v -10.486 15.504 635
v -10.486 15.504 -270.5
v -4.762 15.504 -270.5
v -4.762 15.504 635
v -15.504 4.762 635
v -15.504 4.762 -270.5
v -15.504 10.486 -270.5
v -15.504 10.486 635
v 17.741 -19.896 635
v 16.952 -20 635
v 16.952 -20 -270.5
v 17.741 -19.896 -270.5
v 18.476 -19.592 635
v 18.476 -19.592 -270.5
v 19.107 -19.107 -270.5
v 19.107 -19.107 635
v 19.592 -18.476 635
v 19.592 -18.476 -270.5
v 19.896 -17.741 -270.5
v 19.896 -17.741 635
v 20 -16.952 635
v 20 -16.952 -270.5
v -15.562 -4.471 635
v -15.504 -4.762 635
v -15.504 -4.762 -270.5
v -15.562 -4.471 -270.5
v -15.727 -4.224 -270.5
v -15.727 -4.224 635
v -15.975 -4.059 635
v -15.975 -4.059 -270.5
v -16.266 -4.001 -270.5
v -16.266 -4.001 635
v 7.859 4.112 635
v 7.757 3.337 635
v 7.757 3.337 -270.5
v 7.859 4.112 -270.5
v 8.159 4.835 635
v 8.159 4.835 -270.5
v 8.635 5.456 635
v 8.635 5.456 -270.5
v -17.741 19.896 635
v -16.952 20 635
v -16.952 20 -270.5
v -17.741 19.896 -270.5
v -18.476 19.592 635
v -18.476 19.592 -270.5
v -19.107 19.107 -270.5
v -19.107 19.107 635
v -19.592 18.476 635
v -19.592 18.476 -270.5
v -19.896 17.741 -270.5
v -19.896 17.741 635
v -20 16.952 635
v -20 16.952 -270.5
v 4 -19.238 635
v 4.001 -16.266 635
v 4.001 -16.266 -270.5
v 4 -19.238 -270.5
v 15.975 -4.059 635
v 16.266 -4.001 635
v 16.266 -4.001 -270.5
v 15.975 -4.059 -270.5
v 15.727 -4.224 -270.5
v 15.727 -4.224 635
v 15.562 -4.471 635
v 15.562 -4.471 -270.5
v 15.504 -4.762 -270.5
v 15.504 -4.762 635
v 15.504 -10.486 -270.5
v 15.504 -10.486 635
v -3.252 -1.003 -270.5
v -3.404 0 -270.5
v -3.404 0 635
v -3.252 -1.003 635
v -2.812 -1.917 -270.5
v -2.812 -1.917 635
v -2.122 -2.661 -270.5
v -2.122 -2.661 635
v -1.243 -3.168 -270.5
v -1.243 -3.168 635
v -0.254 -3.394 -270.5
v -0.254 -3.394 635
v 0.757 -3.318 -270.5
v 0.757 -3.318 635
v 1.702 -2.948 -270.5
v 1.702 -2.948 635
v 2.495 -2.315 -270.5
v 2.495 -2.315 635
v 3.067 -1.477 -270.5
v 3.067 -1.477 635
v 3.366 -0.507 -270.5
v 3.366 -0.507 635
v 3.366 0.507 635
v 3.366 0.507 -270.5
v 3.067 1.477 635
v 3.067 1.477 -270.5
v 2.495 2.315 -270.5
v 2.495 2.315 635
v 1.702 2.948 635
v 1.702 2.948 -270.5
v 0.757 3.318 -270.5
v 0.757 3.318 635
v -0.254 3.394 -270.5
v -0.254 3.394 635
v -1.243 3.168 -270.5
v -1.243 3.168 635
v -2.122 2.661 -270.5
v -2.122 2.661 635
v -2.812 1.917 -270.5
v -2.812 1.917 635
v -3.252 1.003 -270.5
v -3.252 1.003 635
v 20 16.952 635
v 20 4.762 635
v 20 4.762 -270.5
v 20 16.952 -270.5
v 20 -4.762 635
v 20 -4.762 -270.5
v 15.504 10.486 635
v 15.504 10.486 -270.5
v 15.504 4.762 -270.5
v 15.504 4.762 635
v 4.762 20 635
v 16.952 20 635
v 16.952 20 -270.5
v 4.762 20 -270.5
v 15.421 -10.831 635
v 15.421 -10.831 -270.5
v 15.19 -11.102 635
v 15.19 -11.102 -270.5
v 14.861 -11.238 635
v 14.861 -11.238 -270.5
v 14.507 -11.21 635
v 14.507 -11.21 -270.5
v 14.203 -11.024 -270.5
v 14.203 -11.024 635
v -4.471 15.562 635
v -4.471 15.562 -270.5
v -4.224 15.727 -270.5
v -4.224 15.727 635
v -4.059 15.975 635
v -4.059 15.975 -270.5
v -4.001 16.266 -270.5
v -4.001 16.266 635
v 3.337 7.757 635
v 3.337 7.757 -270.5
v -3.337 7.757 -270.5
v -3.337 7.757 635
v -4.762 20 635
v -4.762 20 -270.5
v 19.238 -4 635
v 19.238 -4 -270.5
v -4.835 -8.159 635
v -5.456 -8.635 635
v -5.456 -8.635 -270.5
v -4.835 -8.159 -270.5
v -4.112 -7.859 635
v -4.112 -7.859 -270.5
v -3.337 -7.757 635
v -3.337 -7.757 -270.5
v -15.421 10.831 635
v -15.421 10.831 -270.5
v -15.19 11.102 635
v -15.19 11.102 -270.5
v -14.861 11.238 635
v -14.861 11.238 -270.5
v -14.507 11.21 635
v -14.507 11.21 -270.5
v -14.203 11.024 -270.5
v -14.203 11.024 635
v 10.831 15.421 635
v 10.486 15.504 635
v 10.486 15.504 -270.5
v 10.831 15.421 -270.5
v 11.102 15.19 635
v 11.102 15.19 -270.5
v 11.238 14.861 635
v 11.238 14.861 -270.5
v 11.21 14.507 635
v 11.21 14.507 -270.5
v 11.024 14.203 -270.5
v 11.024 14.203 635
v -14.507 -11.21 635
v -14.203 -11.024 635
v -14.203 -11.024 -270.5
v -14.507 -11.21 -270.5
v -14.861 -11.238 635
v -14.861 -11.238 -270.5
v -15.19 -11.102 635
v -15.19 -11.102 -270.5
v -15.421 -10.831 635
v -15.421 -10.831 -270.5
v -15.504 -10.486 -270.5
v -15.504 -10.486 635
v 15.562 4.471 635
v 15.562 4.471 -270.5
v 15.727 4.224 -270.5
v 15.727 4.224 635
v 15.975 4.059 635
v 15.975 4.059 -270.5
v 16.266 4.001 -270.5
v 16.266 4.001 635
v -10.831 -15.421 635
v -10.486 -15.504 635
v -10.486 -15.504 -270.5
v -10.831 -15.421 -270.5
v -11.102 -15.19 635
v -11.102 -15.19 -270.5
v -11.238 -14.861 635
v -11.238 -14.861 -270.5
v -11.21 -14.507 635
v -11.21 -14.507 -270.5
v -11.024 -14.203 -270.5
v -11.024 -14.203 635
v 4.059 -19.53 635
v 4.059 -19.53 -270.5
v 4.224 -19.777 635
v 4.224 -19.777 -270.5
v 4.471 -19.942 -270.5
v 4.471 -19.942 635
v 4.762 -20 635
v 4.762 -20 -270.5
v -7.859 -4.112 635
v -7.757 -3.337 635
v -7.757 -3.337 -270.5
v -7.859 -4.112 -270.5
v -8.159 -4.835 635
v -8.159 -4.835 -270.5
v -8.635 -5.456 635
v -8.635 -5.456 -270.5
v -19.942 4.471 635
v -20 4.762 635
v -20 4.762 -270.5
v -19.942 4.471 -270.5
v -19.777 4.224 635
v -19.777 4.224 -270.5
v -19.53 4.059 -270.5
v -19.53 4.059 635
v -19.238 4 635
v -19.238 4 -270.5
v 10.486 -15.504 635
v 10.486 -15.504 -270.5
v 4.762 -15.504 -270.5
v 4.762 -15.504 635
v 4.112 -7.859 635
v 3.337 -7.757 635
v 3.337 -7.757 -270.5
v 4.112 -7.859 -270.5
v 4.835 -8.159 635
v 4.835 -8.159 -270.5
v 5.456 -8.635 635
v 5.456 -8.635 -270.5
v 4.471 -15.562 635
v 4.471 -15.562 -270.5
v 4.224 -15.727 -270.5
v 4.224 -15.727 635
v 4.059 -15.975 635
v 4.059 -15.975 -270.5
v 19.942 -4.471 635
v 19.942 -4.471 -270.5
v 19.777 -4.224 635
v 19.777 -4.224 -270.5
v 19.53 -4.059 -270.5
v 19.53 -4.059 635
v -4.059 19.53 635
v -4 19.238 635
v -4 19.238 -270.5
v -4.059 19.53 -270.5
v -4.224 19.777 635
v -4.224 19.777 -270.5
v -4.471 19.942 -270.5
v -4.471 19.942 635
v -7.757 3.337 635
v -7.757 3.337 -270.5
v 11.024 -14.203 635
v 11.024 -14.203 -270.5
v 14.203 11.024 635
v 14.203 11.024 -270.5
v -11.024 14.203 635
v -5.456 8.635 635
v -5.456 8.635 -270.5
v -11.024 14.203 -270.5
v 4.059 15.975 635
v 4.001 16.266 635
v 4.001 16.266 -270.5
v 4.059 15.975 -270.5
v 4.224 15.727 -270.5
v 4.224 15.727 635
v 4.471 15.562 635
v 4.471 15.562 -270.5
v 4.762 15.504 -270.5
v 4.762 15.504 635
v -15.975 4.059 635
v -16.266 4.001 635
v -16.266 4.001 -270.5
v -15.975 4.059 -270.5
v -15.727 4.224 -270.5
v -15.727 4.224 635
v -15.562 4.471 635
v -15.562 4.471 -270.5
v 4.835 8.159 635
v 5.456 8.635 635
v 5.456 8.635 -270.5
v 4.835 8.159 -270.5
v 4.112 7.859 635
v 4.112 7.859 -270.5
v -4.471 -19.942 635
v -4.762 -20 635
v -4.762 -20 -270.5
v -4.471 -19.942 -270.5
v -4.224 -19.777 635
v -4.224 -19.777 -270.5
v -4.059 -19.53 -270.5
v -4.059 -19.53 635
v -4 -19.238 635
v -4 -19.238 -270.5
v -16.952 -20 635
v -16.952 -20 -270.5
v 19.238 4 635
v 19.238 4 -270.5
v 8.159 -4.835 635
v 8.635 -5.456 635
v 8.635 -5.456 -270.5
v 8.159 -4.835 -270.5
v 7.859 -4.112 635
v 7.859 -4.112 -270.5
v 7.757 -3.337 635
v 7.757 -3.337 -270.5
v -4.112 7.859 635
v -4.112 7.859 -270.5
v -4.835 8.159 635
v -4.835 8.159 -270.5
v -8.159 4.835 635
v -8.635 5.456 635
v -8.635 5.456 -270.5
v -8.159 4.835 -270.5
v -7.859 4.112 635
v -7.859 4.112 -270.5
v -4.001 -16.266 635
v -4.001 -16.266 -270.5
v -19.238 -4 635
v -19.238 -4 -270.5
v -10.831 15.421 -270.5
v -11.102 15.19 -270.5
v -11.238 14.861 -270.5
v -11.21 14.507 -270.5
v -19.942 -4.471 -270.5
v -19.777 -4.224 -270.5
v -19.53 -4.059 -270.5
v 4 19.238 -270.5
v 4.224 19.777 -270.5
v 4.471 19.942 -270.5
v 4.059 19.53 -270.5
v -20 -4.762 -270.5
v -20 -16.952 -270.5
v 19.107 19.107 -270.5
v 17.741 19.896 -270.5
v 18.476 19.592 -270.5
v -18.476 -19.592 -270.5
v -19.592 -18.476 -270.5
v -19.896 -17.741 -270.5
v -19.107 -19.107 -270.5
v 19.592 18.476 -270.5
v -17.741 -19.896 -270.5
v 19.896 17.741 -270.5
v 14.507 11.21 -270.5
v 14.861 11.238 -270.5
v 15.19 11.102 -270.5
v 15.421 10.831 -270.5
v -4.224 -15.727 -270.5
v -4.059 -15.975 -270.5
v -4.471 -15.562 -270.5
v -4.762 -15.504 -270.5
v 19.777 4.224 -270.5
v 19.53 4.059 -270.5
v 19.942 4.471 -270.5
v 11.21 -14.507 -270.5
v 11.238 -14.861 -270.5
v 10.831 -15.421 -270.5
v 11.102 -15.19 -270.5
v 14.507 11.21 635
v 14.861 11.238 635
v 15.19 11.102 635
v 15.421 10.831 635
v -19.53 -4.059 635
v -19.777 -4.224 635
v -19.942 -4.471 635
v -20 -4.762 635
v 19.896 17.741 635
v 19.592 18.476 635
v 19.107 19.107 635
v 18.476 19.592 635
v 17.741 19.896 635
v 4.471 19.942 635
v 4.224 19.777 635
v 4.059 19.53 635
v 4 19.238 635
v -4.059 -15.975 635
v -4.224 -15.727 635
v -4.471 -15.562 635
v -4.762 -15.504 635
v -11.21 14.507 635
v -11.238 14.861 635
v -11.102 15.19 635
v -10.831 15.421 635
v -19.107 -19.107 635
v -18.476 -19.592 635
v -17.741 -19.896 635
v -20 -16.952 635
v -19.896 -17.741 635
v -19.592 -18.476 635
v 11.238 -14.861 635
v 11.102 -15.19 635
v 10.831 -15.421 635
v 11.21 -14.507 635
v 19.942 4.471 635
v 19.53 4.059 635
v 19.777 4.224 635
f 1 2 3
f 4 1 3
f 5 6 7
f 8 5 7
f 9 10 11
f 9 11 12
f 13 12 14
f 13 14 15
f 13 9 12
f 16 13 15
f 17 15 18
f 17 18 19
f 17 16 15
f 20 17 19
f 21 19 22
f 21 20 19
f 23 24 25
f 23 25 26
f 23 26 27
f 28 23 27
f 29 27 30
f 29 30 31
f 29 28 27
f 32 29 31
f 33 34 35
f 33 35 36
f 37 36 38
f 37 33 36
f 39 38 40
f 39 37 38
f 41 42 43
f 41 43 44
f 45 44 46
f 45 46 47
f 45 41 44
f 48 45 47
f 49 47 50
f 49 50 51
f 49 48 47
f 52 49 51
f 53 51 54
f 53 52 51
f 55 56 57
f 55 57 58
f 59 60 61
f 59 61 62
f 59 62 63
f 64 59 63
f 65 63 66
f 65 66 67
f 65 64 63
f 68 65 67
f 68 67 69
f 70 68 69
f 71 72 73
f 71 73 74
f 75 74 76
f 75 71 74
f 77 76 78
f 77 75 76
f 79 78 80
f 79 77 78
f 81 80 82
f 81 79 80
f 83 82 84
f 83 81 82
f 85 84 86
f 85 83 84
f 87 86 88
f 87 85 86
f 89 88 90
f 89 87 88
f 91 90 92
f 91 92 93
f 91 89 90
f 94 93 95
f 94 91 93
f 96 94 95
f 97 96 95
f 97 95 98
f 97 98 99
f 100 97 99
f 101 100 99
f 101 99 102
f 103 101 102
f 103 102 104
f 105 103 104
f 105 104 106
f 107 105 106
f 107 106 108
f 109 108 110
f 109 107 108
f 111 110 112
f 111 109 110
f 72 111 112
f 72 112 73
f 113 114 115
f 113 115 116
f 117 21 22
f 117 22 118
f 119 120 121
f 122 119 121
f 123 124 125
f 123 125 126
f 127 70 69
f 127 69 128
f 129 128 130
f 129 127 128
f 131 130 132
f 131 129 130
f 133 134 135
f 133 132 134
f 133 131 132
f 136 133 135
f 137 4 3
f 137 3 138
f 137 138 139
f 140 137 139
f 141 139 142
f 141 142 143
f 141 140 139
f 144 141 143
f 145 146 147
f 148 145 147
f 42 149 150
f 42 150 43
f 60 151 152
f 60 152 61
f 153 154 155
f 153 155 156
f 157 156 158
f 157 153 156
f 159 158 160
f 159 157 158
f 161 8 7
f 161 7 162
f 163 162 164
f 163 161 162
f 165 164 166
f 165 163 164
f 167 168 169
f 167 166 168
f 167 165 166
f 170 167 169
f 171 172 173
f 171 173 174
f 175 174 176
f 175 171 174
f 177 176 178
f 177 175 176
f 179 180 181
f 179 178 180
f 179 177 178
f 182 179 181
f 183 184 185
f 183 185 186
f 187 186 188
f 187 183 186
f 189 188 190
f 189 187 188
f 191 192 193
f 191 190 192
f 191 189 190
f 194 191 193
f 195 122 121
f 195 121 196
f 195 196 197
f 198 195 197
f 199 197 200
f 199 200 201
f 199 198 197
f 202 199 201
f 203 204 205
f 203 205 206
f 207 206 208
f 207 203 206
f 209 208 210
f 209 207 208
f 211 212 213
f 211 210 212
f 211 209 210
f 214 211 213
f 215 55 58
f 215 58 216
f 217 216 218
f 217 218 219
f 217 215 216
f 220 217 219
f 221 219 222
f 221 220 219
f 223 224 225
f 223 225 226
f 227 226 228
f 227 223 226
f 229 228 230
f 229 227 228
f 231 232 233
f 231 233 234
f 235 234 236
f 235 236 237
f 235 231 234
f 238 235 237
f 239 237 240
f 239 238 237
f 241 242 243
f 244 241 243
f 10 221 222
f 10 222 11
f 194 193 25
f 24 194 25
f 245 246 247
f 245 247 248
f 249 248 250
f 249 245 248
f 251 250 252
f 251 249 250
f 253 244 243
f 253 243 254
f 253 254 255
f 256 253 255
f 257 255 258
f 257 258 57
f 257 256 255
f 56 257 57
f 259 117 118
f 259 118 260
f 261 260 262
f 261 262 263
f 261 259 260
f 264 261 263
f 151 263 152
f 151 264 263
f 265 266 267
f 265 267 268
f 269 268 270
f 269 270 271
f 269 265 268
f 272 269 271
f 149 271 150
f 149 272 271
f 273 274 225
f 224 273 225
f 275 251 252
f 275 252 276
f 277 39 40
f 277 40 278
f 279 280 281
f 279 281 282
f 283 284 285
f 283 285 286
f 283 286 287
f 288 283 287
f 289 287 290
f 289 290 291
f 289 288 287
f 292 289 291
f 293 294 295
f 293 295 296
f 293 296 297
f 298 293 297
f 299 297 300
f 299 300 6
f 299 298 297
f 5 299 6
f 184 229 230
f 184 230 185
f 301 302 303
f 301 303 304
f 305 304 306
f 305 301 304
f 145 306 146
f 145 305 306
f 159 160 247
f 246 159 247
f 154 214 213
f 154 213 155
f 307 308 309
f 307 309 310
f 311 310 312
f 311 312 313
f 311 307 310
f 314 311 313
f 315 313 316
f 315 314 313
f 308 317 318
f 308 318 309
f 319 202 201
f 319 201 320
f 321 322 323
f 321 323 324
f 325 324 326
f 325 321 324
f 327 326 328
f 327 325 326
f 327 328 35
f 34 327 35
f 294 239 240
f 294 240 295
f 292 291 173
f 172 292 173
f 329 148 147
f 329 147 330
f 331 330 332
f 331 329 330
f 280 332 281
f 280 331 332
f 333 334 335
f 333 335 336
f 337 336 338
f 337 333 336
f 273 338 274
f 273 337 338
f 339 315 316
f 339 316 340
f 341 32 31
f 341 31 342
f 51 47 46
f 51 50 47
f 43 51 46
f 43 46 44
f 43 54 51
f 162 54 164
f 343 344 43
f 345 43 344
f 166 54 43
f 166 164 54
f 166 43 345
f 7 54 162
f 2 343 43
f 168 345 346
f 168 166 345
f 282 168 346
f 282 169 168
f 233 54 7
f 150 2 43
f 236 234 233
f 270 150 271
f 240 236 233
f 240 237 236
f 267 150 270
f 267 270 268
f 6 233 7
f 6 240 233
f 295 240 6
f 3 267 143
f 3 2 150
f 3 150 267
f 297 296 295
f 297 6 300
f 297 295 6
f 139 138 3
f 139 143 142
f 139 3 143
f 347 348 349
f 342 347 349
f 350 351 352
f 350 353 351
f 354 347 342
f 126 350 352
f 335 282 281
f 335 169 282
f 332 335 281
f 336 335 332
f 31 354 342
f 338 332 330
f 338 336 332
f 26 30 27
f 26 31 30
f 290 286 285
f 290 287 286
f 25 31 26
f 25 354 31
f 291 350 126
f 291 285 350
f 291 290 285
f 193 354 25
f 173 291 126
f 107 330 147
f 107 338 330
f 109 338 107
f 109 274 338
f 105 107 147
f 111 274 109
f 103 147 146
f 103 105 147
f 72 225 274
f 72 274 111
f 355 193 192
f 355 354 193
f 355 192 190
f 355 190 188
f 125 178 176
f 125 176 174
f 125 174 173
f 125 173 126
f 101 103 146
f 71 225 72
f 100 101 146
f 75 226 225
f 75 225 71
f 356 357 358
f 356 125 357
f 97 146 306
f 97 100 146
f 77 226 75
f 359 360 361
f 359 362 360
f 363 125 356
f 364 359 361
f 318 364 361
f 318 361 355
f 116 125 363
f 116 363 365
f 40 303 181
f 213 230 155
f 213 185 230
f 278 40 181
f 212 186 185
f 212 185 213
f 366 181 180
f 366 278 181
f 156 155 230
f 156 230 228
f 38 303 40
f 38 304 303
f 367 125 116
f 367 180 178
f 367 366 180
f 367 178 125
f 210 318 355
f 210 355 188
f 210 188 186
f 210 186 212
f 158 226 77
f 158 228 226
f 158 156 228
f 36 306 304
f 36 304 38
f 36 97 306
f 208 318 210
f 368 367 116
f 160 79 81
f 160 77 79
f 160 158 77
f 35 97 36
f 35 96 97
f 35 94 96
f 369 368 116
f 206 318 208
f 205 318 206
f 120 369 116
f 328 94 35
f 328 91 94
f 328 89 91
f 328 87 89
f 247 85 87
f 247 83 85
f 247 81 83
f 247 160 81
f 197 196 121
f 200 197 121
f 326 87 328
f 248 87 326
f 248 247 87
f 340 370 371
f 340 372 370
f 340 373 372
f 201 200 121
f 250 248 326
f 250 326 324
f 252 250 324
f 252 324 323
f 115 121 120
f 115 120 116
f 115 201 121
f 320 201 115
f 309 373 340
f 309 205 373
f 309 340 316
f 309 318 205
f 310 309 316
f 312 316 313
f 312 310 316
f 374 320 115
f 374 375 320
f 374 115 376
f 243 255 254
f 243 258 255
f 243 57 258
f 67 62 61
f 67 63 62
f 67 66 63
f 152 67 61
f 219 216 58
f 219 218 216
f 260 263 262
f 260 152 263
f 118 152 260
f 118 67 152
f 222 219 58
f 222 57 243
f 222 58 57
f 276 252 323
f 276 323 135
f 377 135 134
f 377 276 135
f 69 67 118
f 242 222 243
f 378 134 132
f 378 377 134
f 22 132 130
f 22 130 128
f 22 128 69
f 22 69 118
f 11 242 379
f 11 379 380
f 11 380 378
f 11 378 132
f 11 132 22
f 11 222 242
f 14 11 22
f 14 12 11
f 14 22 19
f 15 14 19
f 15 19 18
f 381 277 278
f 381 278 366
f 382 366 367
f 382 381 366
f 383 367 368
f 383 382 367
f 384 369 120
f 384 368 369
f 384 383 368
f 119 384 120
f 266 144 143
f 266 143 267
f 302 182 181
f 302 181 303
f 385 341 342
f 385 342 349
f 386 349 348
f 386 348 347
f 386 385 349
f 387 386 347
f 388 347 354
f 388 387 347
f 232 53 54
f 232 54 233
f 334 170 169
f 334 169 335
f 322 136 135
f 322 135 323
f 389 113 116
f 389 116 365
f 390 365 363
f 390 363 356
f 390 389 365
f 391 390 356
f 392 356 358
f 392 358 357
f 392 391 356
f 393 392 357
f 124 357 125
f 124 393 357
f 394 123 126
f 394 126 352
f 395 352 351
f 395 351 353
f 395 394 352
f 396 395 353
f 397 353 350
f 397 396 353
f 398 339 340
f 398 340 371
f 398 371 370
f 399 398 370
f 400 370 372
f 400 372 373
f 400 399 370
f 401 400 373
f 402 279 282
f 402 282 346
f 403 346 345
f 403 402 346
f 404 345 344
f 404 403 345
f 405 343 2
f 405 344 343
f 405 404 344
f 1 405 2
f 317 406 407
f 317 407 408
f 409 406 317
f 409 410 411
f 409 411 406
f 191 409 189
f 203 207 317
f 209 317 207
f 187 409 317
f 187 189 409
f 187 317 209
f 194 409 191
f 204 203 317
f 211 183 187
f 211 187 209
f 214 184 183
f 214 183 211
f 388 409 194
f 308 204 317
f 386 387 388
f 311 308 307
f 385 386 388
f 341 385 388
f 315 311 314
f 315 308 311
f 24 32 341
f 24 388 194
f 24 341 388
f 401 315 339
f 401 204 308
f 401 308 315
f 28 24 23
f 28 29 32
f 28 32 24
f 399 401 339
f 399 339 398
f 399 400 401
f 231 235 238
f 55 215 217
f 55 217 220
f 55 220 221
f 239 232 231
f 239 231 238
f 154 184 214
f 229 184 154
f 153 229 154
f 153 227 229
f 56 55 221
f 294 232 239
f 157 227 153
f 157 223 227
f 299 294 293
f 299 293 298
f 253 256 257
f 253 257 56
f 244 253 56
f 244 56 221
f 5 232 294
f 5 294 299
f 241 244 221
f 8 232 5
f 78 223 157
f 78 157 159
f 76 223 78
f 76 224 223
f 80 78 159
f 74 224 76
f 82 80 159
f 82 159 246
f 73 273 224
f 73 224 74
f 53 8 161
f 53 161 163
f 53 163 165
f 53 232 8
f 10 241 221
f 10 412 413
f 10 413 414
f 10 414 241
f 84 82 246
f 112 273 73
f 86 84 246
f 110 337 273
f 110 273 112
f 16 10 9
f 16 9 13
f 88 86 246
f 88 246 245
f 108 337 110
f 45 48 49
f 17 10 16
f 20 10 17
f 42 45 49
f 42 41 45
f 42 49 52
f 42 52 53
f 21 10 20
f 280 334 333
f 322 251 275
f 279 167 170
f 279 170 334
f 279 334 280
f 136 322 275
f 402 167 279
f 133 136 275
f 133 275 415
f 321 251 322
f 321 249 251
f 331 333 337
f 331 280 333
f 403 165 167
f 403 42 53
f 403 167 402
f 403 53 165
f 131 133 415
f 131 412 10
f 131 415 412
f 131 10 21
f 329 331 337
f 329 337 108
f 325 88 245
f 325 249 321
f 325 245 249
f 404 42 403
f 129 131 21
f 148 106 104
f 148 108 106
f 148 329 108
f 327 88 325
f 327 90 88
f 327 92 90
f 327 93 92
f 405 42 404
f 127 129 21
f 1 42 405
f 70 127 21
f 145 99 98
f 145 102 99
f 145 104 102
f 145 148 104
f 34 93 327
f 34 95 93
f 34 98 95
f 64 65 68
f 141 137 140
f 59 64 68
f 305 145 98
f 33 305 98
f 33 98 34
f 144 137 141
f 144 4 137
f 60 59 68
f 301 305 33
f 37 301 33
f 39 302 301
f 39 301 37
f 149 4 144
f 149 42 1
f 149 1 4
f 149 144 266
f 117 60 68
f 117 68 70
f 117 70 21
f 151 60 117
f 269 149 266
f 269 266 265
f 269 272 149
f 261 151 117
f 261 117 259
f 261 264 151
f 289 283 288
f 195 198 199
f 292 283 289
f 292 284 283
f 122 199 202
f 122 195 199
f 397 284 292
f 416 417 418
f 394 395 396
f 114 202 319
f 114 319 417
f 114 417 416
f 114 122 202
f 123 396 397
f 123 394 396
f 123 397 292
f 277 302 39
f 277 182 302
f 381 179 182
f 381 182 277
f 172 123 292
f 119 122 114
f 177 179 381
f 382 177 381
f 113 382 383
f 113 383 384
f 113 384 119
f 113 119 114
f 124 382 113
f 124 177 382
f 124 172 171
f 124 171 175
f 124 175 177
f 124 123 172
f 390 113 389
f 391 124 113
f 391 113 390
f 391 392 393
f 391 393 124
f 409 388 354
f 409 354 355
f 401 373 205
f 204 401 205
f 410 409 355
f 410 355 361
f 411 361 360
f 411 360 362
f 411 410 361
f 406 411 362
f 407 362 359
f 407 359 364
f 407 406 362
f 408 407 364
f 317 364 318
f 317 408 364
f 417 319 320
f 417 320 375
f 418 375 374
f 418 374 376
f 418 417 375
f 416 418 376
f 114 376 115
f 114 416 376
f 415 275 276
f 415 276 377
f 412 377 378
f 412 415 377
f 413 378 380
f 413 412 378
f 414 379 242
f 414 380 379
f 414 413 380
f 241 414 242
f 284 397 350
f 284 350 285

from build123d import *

# Parameters (mm, degrees)
SKETCH1_R          = 3.4036
EXTRUDE1_DEPTH     = 635
CUT_EXTRUDE1_REACH = 638.389
SKETCH4_W          = 58.501723951
SKETCH4_H          = 389.38319937
SKETCH5_W          = 40
SKETCH5_H          = 364.5
CUT_EXTRUDE2_DEPTH = 3.048


with BuildPart() as part:
    # Sketch1 → Extrude1 (new, symmetric)
    with BuildSketch(Plane.XY):
        with BuildLine():
            Line((-20, 16.952), (-20, 4.7625))
            ThreePointArc((-20, 4.7625), (-19.776815367, 4.223684633), (-19.238, 4.0005))
            Line((-19.238, 4.0005), (-16.2662, 4.0005))
            ThreePointArc((-16.2662, 4.0005), (-15.727384633, 4.223684633), (-15.5042, 4.7625))
            Line((-15.5042, 4.7625), (-15.5042, 10.485558599))
            ThreePointArc((-15.5042, 10.485558599), (-15.033804775, 11.189554802), (-14.203384633, 11.024373966))
            Line((-14.203384633, 11.024373966), (-8.635059555, 5.456048889))
            ThreePointArc((-8.635059555, 5.456048889), (-7.985348265, 4.483687227), (-7.7572, 3.336708444))
            Line((-7.7572, 3.336708444), (-7.7572, -3.336708444))
            ThreePointArc((-7.7572, -3.336708444), (-7.985348265, -4.483687227), (-8.635059555, -5.456048889))
            Line((-8.635059555, -5.456048889), (-14.203384633, -11.024373966))
            ThreePointArc((-14.203384633, -11.024373966), (-15.033804775, -11.189554802), (-15.5042, -10.485558599))
            Line((-15.5042, -10.485558599), (-15.5042, -4.7625))
            ThreePointArc((-15.5042, -4.7625), (-15.727384633, -4.223684633), (-16.2662, -4.0005))
            Line((-16.2662, -4.0005), (-19.238, -4.0005))
            ThreePointArc((-19.238, -4.0005), (-19.776815367, -4.223684633), (-20, -4.7625))
            Line((-20, -4.7625), (-20, -16.952))
            ThreePointArc((-20, -16.952), (-19.107261469, -19.107261469), (-16.952, -20))
            Line((-16.952, -20), (-4.7625, -20))
            ThreePointArc((-4.7625, -20), (-4.223684633, -19.776815367), (-4.0005, -19.238))
            Line((-4.0005, -19.238), (-4.0005, -16.2662))
            ThreePointArc((-4.0005, -16.2662), (-4.223684633, -15.727384633), (-4.7625, -15.5042))
            Line((-4.7625, -15.5042), (-10.485558599, -15.5042))
            ThreePointArc((-10.485558599, -15.5042), (-11.189554802, -15.033804775), (-11.024373966, -14.203384633))
            Line((-11.024373966, -14.203384633), (-5.456048889, -8.635059555))
            ThreePointArc((-5.456048889, -8.635059555), (-4.483687227, -7.985348265), (-3.336708444, -7.7572))
            Line((-3.336708444, -7.7572), (3.336708444, -7.7572))
            ThreePointArc((3.336708444, -7.7572), (4.483687227, -7.985348265), (5.456048889, -8.635059555))
            Line((5.456048889, -8.635059555), (11.024373966, -14.203384633))
            ThreePointArc((11.024373966, -14.203384633), (11.189554802, -15.033804775), (10.485558599, -15.5042))
            Line((10.485558599, -15.5042), (4.7625, -15.5042))
            ThreePointArc((4.7625, -15.5042), (4.223684633, -15.727384633), (4.0005, -16.2662))
            Line((4.0005, -16.2662), (4.0005, -19.238))
            ThreePointArc((4.0005, -19.238), (4.223684633, -19.776815367), (4.7625, -20))
            Line((4.7625, -20), (16.952, -20))
            ThreePointArc((16.952, -20), (19.107261469, -19.107261469), (20, -16.952))
            Line((20, -16.952), (20, -4.7625))
            ThreePointArc((20, -4.7625), (19.776815367, -4.223684633), (19.238, -4.0005))
            Line((19.238, -4.0005), (16.2662, -4.0005))
            ThreePointArc((16.2662, -4.0005), (15.727384633, -4.223684633), (15.5042, -4.7625))
            Line((15.5042, -4.7625), (15.5042, -10.485558599))
            ThreePointArc((15.5042, -10.485558599), (15.033804775, -11.189554802), (14.203384633, -11.024373966))
            Line((14.203384633, -11.024373966), (8.635059555, -5.456048889))
            ThreePointArc((8.635059555, -5.456048889), (7.985348265, -4.483687227), (7.7572, -3.336708444))
            Line((7.7572, -3.336708444), (7.7572, 3.336708444))
            ThreePointArc((7.7572, 3.336708444), (7.985348265, 4.483687227), (8.635059555, 5.456048889))
            Line((8.635059555, 5.456048889), (14.203384633, 11.024373966))
            ThreePointArc((14.203384633, 11.024373966), (15.033804775, 11.189554802), (15.5042, 10.485558599))
            Line((15.5042, 10.485558599), (15.5042, 4.7625))
            ThreePointArc((15.5042, 4.7625), (15.727384633, 4.223684633), (16.2662, 4.0005))
            Line((16.2662, 4.0005), (19.238, 4.0005))
            ThreePointArc((19.238, 4.0005), (19.776815367, 4.223684633), (20, 4.7625))
            Line((20, 4.7625), (20, 16.952))
            ThreePointArc((20, 16.952), (19.107261469, 19.107261469), (16.952, 20))
            Line((16.952, 20), (4.7625, 20))
            ThreePointArc((4.7625, 20), (4.223684633, 19.776815367), (4.0005, 19.238))
            Line((4.0005, 19.238), (4.0005, 16.2662))
            ThreePointArc((4.0005, 16.2662), (4.223684633, 15.727384633), (4.7625, 15.5042))
            Line((4.7625, 15.5042), (10.485558599, 15.5042))
            ThreePointArc((10.485558599, 15.5042), (11.189554802, 15.033804775), (11.024373966, 14.203384633))
            Line((11.024373966, 14.203384633), (5.456048889, 8.635059555))
            ThreePointArc((5.456048889, 8.635059555), (4.483687227, 7.985348265), (3.336708444, 7.7572))
            Line((3.336708444, 7.7572), (-3.336708444, 7.7572))
            ThreePointArc((-3.336708444, 7.7572), (-4.483687227, 7.985348265), (-5.456048889, 8.635059555))
            Line((-5.456048889, 8.635059555), (-11.024373966, 14.203384633))
            ThreePointArc((-11.024373966, 14.203384633), (-11.189554802, 15.033804775), (-10.485558599, 15.5042))
            Line((-10.485558599, 15.5042), (-4.7625, 15.5042))
            ThreePointArc((-4.7625, 15.5042), (-4.223684633, 15.727384633), (-4.0005, 16.2662))
            Line((-4.0005, 16.2662), (-4.0005, 19.238))
            ThreePointArc((-4.0005, 19.238), (-4.223684633, 19.776815367), (-4.7625, 20))
            Line((-4.7625, 20), (-16.952, 20))
            ThreePointArc((-16.952, 20), (-19.107261469, 19.107261469), (-20, 16.952))
        make_face()
        with Locations(Location((0, 0, 0), (0, 0, 180))):
            Circle(SKETCH1_R, mode=Mode.SUBTRACT)
    extrude(amount=EXTRUDE1_DEPTH, both=True)

    # Cut-Extrude1: up to this face of the body (flat: up to its plane)
    cut_extrude1_end = Plane(part.part.faces().sort_by_distance((10.85725, -20, 0))[0])
    # Sketch4 → Cut-Extrude1 (cut, up to the picked face)
    with BuildSketch(Plane(origin=(0, 16.952, 0), x_dir=(1, 0, 0), z_dir=(0, 1, 0)), mode=Mode.PRIVATE) as cut_extrude1_sk1:
        with Locations((5.781251025, 465.191599685)):
            Rectangle(SKETCH4_W, SKETCH4_H)
    cut_extrude1_tool1 = split(extrude(cut_extrude1_sk1.sketch, amount=-CUT_EXTRUDE1_REACH, mode=Mode.PRIVATE), bisect_by=cut_extrude1_end, keep=Keep.BOTH, mode=Mode.PRIVATE)
    add(cut_extrude1_tool1.solids().sort_by(Axis((5.781251, 16.952, -465.1916), (0, -1, 0)))[0], mode=Mode.SUBTRACT)

    # Sketch5 → Cut-Extrude2 (cut)
    with BuildSketch(Plane.XZ.offset(-16.952)):
        with Locations((0, -452.75)):
            Rectangle(SKETCH5_W, SKETCH5_H)
    extrude(amount=-CUT_EXTRUDE2_DEPTH, mode=Mode.SUBTRACT)


solid = part.part
